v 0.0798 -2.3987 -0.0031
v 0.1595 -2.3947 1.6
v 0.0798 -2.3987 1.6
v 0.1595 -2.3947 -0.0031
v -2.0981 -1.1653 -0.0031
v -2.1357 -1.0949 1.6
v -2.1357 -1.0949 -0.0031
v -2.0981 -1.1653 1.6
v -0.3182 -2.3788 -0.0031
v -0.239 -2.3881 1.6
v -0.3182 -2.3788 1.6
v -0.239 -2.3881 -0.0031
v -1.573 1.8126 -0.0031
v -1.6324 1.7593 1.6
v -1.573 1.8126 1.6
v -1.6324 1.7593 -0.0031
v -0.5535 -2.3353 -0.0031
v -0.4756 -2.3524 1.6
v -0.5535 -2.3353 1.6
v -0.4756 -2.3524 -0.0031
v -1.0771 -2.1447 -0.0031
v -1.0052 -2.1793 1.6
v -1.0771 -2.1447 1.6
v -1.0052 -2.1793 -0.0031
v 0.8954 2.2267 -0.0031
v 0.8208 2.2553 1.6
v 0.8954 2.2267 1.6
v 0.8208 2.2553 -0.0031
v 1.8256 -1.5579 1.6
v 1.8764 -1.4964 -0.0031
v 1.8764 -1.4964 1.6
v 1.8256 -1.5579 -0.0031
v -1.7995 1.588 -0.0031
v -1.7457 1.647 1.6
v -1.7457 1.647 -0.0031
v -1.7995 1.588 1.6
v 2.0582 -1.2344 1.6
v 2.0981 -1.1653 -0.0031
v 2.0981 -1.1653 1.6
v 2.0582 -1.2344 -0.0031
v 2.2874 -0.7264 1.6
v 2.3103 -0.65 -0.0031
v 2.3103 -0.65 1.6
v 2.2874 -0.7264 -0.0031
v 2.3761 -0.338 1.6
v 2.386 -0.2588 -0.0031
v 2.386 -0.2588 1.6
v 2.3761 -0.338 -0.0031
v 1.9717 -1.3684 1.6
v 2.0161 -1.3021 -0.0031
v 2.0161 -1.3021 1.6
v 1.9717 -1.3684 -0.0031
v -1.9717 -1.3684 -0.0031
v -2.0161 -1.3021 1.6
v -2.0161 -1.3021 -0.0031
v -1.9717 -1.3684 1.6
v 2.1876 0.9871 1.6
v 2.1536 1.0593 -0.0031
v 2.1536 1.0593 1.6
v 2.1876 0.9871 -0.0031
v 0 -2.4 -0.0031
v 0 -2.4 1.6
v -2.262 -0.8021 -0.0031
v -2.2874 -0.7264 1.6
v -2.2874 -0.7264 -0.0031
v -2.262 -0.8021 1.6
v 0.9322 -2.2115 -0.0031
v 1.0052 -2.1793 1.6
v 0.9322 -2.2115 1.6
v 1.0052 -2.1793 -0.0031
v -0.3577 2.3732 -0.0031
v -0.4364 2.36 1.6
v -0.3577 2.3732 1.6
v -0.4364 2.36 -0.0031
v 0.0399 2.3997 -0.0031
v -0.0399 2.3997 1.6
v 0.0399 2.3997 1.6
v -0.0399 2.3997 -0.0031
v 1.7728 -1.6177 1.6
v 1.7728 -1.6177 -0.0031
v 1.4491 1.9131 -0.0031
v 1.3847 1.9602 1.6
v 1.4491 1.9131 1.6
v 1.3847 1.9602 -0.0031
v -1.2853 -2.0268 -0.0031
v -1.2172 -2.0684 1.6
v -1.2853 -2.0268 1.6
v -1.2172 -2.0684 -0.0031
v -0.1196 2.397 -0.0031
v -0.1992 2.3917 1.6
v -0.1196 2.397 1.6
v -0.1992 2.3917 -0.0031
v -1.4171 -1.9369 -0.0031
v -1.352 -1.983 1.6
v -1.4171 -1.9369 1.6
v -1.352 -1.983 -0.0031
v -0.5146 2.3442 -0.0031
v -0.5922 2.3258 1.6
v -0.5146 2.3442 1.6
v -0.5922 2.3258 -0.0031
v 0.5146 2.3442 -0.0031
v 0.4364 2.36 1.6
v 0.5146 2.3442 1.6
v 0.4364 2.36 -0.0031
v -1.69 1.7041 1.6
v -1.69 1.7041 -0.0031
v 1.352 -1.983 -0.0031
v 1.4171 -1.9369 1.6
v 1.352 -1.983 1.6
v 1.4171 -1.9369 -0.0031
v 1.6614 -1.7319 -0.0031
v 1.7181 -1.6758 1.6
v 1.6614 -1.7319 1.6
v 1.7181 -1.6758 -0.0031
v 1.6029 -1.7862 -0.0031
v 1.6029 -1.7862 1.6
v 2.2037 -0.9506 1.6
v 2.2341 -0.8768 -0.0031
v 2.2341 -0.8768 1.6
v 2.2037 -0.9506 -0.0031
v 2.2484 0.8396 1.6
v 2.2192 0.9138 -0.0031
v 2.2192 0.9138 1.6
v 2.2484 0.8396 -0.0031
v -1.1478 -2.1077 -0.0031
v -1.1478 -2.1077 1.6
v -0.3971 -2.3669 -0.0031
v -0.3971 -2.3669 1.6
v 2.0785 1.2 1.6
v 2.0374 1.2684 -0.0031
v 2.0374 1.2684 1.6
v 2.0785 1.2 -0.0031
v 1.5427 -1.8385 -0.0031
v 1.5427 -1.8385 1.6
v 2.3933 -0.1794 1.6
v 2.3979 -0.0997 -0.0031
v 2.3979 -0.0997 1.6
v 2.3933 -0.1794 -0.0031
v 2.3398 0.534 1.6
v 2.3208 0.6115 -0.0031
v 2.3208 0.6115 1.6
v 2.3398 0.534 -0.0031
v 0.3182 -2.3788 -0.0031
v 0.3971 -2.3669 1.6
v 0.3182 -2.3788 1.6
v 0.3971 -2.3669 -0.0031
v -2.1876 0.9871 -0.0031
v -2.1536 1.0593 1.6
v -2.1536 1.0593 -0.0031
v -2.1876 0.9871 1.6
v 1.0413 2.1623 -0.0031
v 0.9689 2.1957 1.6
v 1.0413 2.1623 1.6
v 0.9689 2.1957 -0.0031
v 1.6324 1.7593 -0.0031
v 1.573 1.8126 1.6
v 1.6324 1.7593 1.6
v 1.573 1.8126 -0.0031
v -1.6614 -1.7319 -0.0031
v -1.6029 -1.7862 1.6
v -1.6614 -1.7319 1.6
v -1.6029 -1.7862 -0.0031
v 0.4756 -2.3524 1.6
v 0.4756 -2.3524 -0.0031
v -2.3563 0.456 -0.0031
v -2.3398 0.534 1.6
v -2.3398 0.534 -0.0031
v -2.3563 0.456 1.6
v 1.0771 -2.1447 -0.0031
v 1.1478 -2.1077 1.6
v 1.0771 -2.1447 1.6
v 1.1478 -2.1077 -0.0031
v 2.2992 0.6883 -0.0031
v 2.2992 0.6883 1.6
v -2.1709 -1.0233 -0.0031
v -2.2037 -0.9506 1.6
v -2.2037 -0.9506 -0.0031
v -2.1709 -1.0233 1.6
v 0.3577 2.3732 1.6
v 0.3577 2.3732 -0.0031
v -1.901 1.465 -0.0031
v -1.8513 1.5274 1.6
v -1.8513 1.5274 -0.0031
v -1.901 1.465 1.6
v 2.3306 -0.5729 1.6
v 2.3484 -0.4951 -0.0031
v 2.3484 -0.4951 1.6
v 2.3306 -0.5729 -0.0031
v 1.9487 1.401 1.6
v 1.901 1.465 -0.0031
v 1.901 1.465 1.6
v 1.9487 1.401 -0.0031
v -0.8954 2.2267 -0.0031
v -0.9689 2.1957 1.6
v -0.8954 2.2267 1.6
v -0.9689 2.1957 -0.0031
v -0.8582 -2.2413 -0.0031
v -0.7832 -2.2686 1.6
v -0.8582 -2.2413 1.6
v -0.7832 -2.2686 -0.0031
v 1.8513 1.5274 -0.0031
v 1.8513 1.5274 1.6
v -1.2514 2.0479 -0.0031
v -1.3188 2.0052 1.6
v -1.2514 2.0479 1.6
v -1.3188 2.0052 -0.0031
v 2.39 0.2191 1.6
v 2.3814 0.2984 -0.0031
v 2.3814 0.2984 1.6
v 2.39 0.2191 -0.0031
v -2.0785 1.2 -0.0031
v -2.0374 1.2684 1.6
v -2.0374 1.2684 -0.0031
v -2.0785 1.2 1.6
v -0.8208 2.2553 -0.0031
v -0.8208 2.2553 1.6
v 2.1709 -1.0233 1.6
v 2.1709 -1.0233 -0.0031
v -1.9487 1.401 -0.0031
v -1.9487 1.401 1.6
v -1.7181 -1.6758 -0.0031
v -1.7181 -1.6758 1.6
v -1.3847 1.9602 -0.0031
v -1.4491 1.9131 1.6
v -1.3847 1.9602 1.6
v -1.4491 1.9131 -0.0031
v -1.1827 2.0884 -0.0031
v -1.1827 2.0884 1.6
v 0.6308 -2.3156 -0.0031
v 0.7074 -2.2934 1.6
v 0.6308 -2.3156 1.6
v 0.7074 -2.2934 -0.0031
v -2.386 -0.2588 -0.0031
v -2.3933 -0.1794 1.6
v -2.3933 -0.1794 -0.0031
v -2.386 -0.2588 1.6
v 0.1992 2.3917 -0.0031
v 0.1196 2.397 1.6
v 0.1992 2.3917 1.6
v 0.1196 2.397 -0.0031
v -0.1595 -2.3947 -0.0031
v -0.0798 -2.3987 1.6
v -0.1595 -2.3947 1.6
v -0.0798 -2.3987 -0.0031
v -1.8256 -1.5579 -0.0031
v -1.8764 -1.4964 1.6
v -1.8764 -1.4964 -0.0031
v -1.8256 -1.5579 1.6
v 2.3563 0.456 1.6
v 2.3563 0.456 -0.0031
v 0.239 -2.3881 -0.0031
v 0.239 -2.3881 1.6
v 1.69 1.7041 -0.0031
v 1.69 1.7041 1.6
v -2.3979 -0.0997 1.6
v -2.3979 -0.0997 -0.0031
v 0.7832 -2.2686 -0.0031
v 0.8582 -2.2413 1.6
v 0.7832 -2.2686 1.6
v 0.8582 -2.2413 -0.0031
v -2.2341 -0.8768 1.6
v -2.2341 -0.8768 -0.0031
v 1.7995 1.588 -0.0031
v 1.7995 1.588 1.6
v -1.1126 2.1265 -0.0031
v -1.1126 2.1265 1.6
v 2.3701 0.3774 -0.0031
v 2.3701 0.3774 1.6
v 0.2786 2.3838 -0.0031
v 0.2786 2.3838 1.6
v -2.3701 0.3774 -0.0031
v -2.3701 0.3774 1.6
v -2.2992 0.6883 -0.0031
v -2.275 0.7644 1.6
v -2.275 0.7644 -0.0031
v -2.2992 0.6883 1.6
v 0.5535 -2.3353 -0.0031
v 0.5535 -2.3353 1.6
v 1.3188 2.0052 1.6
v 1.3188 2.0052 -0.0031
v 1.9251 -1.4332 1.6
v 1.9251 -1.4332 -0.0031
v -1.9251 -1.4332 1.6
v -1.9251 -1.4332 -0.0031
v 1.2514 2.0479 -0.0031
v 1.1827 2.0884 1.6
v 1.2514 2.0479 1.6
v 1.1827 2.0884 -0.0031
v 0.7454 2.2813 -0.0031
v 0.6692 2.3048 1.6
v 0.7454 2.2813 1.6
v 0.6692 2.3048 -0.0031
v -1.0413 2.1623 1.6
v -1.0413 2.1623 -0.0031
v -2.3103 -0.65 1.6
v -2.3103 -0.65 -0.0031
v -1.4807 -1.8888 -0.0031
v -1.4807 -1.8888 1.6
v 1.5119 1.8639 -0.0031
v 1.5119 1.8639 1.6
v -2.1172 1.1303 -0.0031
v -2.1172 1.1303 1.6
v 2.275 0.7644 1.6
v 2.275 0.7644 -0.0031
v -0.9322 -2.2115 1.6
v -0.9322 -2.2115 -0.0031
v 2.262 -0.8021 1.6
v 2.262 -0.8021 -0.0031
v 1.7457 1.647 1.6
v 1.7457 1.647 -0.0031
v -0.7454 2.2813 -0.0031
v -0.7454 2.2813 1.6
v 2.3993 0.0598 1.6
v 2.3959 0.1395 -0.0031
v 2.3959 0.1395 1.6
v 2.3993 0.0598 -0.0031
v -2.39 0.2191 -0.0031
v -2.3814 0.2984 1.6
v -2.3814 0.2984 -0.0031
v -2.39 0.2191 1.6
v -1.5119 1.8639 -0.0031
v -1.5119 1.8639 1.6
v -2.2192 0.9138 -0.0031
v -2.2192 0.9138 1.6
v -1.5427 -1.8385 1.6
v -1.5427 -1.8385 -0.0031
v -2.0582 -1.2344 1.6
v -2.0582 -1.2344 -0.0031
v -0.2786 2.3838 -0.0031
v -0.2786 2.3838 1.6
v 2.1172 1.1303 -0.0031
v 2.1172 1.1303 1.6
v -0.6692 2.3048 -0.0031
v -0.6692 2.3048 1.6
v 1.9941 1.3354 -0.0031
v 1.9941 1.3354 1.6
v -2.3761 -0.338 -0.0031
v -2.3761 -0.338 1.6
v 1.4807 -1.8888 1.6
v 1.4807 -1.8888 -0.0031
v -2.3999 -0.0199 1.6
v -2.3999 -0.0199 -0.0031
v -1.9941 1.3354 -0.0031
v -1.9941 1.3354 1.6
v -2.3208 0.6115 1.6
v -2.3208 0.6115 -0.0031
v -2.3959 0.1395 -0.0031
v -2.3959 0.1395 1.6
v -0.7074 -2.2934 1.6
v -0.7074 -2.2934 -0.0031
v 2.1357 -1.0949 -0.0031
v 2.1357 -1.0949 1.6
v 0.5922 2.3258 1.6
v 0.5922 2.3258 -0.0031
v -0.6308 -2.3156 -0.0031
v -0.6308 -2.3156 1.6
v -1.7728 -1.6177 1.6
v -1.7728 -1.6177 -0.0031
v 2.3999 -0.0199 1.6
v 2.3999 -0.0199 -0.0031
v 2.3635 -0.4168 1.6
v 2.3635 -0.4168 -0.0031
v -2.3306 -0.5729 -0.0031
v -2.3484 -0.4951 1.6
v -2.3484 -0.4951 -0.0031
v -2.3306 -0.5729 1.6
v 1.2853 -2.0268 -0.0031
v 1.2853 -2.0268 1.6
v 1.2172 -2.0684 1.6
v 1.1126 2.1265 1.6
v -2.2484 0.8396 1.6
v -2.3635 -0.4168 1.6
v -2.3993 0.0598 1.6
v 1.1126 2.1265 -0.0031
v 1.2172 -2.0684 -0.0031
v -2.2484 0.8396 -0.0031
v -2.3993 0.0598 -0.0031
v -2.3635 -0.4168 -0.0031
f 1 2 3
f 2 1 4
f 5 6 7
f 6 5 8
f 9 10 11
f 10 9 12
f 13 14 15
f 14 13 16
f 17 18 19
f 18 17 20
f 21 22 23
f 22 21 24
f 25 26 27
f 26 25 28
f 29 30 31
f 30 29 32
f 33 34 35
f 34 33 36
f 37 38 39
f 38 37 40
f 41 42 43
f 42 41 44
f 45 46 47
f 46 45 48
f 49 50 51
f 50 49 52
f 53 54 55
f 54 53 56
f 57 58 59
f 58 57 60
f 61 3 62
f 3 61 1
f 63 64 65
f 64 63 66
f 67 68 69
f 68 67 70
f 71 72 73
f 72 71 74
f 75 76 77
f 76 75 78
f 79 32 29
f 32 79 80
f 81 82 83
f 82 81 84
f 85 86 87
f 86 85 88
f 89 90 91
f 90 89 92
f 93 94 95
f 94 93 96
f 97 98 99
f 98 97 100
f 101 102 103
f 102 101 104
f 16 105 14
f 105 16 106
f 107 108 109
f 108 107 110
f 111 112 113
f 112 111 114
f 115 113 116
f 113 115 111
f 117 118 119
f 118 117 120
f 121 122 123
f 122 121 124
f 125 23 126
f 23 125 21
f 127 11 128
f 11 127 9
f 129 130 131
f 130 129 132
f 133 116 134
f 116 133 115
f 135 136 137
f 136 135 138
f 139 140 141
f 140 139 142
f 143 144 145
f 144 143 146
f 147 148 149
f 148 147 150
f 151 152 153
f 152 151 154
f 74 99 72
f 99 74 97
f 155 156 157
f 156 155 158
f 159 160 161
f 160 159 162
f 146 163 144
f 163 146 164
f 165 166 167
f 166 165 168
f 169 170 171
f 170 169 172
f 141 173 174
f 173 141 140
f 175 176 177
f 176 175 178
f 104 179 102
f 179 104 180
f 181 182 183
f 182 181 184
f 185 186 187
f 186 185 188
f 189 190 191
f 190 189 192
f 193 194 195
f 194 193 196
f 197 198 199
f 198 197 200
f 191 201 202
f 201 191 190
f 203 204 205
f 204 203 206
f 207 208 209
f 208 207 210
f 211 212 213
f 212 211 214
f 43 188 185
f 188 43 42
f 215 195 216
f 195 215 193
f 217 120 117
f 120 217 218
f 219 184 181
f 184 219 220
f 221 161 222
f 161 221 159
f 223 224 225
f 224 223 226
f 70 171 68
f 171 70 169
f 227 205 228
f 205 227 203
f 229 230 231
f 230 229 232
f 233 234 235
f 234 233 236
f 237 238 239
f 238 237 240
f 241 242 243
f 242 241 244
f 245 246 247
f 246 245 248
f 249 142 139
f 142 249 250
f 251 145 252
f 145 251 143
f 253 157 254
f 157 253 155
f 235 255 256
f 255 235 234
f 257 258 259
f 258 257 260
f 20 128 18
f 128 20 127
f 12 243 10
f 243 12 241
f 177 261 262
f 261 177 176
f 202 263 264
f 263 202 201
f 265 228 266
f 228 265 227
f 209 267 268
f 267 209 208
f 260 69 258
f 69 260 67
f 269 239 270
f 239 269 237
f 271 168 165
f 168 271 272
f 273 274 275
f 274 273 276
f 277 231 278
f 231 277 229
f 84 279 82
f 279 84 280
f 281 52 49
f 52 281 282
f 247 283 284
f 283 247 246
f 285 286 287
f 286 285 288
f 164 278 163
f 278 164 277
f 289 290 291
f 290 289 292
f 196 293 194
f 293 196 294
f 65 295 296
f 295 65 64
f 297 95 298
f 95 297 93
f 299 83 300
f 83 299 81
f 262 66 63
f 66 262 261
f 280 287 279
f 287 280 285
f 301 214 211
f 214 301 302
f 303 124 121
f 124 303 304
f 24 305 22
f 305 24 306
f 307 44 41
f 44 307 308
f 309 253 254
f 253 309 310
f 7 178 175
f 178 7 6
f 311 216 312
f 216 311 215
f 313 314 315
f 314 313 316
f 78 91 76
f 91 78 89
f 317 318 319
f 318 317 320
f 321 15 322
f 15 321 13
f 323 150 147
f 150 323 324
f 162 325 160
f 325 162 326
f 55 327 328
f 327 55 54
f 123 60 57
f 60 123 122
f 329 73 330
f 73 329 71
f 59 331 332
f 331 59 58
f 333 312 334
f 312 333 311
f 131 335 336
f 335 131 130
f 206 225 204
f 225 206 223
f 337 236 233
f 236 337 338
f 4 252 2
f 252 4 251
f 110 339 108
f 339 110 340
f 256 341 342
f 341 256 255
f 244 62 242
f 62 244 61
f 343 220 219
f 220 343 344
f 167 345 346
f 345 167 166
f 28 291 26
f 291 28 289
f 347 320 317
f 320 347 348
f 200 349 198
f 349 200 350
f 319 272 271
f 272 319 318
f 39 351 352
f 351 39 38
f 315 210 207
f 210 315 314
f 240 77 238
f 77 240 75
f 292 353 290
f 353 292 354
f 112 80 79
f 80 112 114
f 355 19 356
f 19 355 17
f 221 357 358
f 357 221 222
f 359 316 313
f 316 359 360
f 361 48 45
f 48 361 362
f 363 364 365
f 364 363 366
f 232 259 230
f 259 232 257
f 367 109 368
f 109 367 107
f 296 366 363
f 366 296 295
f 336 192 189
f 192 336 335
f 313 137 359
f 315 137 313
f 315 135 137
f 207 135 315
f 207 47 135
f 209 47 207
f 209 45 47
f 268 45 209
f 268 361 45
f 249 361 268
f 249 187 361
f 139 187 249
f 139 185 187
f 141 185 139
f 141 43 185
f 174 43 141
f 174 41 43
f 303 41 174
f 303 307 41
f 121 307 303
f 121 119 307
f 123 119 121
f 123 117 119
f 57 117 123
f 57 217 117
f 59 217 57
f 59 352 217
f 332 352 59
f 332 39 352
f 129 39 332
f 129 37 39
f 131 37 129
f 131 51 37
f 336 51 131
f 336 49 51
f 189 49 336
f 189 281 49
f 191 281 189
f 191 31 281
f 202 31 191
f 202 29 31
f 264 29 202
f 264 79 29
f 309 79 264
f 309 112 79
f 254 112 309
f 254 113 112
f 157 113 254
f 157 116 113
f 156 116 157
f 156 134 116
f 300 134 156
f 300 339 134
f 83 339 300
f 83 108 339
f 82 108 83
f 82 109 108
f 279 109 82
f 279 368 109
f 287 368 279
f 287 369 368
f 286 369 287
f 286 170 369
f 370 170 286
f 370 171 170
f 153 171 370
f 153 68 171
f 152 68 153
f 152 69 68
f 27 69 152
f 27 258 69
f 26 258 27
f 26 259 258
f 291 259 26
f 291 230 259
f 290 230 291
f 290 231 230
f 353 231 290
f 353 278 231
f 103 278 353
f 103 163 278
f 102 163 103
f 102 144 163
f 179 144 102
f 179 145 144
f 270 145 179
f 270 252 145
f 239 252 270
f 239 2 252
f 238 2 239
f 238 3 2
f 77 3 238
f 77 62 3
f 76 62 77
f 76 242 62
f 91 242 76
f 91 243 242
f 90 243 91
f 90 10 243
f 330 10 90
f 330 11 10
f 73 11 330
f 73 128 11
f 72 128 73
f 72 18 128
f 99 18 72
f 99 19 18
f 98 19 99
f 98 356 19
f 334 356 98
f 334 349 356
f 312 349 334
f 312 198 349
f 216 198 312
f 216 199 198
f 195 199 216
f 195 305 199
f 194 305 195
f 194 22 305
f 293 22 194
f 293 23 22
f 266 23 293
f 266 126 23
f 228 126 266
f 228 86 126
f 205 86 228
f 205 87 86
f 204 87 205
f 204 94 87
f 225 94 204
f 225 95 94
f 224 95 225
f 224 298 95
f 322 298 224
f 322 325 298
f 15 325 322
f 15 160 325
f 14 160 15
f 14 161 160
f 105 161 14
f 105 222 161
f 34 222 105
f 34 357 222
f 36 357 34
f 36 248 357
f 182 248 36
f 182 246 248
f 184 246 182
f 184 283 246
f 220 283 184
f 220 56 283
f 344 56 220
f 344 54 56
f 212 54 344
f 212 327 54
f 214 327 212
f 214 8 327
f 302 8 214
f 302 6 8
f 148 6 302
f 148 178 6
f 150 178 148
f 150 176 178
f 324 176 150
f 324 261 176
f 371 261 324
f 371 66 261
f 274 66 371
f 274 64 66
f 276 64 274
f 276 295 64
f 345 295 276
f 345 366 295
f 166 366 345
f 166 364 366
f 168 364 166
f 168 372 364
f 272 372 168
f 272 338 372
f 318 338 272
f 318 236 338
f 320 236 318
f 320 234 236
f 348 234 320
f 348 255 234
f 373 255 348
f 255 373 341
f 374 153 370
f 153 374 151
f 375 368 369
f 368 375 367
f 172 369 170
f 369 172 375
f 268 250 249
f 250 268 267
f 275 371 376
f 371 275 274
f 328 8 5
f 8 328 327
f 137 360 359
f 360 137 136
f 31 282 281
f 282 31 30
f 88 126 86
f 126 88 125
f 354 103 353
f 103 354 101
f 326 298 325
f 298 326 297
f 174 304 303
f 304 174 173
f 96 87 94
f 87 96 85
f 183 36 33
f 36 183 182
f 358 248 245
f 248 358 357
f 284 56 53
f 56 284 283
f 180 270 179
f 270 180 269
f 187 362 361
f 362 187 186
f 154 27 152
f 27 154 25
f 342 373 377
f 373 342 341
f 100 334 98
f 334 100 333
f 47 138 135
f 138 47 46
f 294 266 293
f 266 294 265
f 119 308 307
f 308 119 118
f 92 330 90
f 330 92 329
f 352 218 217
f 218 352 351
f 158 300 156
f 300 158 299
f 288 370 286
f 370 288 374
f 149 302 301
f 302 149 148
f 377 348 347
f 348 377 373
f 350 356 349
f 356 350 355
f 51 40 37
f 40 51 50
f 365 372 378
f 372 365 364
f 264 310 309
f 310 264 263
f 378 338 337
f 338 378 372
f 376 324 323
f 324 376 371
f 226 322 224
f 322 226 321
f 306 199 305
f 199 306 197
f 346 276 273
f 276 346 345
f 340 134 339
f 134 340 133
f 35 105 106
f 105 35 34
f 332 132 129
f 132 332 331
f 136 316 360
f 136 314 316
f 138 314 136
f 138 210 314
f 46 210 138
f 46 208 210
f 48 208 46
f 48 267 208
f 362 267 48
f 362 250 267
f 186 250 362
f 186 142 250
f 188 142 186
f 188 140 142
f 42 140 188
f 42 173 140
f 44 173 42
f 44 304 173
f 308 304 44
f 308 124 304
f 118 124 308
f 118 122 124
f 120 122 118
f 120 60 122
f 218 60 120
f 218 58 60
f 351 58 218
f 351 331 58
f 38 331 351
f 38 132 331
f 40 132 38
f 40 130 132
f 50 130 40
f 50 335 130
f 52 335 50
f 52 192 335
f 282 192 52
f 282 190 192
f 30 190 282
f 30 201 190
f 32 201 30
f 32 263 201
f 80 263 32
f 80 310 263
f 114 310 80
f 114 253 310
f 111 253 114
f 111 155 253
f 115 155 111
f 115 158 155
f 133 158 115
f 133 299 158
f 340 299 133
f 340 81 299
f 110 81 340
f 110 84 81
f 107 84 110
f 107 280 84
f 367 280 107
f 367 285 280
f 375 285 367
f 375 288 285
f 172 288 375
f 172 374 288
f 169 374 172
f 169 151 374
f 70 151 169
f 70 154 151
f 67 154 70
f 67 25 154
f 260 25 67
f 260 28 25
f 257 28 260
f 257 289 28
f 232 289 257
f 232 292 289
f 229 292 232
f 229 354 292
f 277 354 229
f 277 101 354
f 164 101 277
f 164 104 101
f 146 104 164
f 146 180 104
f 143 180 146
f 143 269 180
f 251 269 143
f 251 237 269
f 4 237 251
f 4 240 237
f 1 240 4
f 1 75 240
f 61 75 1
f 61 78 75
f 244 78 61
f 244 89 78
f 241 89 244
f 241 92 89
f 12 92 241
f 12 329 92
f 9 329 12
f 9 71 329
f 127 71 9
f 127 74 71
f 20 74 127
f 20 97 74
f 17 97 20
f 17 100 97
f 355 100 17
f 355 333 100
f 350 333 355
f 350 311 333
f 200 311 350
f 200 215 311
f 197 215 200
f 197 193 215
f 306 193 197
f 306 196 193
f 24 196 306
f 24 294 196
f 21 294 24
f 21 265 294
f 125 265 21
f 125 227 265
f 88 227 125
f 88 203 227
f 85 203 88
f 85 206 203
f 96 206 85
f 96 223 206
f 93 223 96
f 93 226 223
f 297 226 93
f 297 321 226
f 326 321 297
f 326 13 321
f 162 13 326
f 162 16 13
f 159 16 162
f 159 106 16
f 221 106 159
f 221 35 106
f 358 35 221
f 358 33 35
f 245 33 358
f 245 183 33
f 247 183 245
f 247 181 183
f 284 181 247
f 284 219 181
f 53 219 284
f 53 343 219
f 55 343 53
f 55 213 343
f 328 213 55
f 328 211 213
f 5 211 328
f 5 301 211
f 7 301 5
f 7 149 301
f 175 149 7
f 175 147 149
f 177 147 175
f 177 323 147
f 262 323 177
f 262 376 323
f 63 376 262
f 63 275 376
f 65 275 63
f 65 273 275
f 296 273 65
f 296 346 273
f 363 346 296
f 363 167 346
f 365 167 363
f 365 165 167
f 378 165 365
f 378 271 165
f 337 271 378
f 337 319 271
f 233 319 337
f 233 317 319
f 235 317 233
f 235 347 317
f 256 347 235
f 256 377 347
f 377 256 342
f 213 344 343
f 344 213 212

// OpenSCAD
use <../lib.scad>
use <4081b.scad>
$fa=1; $fs=0.2;
function ldraw_lib__174(realsolid=false) = [
// 0 ~Moved to 4081b
// 0 Name: 174.dat
// 0 Author: [PTadmin]
// 0 !LDRAW_ORG Part UPDATE 2003-03
// 0 !LICENSE Licensed under CC BY 4.0 : see CAreadme.txt
// 
// 0 BFC CERTIFY CCW
  [0,"BFC","CERTIFY"],
  [0,"BFC","CCW"],
// 
// 0 !HISTORY 1998-06-20 [PTadmin] Official Update 1998-06
// 0 !HISTORY 2003-12-19 [PTadmin] Official Update 2003-03
// 0 !HISTORY 2007-05-10 [PTadmin] Header formatted for Contributor Agreement
// 0 !HISTORY 2008-07-01 [PTadmin] Official Update 2008-01
// 
// 
// 1 16 0 0 0 1 0 0 0 1 0 0 0 1 4081b.dat
  [1,16,0,0,0,1,0,0,0,1,0,0,0,1, ldraw_lib__4081b(realsolid)],
// 0
];
module ldraw_lib__174(step=0, col=false, unit=2/5, alt=false, line=0.2, solid=!$preview)
    makepoly(ldraw_lib__174(solid), step=step, col=col, unit=unit, alt=alt, line=line, solid=solid);
ldraw_lib__174(line=0.2);
